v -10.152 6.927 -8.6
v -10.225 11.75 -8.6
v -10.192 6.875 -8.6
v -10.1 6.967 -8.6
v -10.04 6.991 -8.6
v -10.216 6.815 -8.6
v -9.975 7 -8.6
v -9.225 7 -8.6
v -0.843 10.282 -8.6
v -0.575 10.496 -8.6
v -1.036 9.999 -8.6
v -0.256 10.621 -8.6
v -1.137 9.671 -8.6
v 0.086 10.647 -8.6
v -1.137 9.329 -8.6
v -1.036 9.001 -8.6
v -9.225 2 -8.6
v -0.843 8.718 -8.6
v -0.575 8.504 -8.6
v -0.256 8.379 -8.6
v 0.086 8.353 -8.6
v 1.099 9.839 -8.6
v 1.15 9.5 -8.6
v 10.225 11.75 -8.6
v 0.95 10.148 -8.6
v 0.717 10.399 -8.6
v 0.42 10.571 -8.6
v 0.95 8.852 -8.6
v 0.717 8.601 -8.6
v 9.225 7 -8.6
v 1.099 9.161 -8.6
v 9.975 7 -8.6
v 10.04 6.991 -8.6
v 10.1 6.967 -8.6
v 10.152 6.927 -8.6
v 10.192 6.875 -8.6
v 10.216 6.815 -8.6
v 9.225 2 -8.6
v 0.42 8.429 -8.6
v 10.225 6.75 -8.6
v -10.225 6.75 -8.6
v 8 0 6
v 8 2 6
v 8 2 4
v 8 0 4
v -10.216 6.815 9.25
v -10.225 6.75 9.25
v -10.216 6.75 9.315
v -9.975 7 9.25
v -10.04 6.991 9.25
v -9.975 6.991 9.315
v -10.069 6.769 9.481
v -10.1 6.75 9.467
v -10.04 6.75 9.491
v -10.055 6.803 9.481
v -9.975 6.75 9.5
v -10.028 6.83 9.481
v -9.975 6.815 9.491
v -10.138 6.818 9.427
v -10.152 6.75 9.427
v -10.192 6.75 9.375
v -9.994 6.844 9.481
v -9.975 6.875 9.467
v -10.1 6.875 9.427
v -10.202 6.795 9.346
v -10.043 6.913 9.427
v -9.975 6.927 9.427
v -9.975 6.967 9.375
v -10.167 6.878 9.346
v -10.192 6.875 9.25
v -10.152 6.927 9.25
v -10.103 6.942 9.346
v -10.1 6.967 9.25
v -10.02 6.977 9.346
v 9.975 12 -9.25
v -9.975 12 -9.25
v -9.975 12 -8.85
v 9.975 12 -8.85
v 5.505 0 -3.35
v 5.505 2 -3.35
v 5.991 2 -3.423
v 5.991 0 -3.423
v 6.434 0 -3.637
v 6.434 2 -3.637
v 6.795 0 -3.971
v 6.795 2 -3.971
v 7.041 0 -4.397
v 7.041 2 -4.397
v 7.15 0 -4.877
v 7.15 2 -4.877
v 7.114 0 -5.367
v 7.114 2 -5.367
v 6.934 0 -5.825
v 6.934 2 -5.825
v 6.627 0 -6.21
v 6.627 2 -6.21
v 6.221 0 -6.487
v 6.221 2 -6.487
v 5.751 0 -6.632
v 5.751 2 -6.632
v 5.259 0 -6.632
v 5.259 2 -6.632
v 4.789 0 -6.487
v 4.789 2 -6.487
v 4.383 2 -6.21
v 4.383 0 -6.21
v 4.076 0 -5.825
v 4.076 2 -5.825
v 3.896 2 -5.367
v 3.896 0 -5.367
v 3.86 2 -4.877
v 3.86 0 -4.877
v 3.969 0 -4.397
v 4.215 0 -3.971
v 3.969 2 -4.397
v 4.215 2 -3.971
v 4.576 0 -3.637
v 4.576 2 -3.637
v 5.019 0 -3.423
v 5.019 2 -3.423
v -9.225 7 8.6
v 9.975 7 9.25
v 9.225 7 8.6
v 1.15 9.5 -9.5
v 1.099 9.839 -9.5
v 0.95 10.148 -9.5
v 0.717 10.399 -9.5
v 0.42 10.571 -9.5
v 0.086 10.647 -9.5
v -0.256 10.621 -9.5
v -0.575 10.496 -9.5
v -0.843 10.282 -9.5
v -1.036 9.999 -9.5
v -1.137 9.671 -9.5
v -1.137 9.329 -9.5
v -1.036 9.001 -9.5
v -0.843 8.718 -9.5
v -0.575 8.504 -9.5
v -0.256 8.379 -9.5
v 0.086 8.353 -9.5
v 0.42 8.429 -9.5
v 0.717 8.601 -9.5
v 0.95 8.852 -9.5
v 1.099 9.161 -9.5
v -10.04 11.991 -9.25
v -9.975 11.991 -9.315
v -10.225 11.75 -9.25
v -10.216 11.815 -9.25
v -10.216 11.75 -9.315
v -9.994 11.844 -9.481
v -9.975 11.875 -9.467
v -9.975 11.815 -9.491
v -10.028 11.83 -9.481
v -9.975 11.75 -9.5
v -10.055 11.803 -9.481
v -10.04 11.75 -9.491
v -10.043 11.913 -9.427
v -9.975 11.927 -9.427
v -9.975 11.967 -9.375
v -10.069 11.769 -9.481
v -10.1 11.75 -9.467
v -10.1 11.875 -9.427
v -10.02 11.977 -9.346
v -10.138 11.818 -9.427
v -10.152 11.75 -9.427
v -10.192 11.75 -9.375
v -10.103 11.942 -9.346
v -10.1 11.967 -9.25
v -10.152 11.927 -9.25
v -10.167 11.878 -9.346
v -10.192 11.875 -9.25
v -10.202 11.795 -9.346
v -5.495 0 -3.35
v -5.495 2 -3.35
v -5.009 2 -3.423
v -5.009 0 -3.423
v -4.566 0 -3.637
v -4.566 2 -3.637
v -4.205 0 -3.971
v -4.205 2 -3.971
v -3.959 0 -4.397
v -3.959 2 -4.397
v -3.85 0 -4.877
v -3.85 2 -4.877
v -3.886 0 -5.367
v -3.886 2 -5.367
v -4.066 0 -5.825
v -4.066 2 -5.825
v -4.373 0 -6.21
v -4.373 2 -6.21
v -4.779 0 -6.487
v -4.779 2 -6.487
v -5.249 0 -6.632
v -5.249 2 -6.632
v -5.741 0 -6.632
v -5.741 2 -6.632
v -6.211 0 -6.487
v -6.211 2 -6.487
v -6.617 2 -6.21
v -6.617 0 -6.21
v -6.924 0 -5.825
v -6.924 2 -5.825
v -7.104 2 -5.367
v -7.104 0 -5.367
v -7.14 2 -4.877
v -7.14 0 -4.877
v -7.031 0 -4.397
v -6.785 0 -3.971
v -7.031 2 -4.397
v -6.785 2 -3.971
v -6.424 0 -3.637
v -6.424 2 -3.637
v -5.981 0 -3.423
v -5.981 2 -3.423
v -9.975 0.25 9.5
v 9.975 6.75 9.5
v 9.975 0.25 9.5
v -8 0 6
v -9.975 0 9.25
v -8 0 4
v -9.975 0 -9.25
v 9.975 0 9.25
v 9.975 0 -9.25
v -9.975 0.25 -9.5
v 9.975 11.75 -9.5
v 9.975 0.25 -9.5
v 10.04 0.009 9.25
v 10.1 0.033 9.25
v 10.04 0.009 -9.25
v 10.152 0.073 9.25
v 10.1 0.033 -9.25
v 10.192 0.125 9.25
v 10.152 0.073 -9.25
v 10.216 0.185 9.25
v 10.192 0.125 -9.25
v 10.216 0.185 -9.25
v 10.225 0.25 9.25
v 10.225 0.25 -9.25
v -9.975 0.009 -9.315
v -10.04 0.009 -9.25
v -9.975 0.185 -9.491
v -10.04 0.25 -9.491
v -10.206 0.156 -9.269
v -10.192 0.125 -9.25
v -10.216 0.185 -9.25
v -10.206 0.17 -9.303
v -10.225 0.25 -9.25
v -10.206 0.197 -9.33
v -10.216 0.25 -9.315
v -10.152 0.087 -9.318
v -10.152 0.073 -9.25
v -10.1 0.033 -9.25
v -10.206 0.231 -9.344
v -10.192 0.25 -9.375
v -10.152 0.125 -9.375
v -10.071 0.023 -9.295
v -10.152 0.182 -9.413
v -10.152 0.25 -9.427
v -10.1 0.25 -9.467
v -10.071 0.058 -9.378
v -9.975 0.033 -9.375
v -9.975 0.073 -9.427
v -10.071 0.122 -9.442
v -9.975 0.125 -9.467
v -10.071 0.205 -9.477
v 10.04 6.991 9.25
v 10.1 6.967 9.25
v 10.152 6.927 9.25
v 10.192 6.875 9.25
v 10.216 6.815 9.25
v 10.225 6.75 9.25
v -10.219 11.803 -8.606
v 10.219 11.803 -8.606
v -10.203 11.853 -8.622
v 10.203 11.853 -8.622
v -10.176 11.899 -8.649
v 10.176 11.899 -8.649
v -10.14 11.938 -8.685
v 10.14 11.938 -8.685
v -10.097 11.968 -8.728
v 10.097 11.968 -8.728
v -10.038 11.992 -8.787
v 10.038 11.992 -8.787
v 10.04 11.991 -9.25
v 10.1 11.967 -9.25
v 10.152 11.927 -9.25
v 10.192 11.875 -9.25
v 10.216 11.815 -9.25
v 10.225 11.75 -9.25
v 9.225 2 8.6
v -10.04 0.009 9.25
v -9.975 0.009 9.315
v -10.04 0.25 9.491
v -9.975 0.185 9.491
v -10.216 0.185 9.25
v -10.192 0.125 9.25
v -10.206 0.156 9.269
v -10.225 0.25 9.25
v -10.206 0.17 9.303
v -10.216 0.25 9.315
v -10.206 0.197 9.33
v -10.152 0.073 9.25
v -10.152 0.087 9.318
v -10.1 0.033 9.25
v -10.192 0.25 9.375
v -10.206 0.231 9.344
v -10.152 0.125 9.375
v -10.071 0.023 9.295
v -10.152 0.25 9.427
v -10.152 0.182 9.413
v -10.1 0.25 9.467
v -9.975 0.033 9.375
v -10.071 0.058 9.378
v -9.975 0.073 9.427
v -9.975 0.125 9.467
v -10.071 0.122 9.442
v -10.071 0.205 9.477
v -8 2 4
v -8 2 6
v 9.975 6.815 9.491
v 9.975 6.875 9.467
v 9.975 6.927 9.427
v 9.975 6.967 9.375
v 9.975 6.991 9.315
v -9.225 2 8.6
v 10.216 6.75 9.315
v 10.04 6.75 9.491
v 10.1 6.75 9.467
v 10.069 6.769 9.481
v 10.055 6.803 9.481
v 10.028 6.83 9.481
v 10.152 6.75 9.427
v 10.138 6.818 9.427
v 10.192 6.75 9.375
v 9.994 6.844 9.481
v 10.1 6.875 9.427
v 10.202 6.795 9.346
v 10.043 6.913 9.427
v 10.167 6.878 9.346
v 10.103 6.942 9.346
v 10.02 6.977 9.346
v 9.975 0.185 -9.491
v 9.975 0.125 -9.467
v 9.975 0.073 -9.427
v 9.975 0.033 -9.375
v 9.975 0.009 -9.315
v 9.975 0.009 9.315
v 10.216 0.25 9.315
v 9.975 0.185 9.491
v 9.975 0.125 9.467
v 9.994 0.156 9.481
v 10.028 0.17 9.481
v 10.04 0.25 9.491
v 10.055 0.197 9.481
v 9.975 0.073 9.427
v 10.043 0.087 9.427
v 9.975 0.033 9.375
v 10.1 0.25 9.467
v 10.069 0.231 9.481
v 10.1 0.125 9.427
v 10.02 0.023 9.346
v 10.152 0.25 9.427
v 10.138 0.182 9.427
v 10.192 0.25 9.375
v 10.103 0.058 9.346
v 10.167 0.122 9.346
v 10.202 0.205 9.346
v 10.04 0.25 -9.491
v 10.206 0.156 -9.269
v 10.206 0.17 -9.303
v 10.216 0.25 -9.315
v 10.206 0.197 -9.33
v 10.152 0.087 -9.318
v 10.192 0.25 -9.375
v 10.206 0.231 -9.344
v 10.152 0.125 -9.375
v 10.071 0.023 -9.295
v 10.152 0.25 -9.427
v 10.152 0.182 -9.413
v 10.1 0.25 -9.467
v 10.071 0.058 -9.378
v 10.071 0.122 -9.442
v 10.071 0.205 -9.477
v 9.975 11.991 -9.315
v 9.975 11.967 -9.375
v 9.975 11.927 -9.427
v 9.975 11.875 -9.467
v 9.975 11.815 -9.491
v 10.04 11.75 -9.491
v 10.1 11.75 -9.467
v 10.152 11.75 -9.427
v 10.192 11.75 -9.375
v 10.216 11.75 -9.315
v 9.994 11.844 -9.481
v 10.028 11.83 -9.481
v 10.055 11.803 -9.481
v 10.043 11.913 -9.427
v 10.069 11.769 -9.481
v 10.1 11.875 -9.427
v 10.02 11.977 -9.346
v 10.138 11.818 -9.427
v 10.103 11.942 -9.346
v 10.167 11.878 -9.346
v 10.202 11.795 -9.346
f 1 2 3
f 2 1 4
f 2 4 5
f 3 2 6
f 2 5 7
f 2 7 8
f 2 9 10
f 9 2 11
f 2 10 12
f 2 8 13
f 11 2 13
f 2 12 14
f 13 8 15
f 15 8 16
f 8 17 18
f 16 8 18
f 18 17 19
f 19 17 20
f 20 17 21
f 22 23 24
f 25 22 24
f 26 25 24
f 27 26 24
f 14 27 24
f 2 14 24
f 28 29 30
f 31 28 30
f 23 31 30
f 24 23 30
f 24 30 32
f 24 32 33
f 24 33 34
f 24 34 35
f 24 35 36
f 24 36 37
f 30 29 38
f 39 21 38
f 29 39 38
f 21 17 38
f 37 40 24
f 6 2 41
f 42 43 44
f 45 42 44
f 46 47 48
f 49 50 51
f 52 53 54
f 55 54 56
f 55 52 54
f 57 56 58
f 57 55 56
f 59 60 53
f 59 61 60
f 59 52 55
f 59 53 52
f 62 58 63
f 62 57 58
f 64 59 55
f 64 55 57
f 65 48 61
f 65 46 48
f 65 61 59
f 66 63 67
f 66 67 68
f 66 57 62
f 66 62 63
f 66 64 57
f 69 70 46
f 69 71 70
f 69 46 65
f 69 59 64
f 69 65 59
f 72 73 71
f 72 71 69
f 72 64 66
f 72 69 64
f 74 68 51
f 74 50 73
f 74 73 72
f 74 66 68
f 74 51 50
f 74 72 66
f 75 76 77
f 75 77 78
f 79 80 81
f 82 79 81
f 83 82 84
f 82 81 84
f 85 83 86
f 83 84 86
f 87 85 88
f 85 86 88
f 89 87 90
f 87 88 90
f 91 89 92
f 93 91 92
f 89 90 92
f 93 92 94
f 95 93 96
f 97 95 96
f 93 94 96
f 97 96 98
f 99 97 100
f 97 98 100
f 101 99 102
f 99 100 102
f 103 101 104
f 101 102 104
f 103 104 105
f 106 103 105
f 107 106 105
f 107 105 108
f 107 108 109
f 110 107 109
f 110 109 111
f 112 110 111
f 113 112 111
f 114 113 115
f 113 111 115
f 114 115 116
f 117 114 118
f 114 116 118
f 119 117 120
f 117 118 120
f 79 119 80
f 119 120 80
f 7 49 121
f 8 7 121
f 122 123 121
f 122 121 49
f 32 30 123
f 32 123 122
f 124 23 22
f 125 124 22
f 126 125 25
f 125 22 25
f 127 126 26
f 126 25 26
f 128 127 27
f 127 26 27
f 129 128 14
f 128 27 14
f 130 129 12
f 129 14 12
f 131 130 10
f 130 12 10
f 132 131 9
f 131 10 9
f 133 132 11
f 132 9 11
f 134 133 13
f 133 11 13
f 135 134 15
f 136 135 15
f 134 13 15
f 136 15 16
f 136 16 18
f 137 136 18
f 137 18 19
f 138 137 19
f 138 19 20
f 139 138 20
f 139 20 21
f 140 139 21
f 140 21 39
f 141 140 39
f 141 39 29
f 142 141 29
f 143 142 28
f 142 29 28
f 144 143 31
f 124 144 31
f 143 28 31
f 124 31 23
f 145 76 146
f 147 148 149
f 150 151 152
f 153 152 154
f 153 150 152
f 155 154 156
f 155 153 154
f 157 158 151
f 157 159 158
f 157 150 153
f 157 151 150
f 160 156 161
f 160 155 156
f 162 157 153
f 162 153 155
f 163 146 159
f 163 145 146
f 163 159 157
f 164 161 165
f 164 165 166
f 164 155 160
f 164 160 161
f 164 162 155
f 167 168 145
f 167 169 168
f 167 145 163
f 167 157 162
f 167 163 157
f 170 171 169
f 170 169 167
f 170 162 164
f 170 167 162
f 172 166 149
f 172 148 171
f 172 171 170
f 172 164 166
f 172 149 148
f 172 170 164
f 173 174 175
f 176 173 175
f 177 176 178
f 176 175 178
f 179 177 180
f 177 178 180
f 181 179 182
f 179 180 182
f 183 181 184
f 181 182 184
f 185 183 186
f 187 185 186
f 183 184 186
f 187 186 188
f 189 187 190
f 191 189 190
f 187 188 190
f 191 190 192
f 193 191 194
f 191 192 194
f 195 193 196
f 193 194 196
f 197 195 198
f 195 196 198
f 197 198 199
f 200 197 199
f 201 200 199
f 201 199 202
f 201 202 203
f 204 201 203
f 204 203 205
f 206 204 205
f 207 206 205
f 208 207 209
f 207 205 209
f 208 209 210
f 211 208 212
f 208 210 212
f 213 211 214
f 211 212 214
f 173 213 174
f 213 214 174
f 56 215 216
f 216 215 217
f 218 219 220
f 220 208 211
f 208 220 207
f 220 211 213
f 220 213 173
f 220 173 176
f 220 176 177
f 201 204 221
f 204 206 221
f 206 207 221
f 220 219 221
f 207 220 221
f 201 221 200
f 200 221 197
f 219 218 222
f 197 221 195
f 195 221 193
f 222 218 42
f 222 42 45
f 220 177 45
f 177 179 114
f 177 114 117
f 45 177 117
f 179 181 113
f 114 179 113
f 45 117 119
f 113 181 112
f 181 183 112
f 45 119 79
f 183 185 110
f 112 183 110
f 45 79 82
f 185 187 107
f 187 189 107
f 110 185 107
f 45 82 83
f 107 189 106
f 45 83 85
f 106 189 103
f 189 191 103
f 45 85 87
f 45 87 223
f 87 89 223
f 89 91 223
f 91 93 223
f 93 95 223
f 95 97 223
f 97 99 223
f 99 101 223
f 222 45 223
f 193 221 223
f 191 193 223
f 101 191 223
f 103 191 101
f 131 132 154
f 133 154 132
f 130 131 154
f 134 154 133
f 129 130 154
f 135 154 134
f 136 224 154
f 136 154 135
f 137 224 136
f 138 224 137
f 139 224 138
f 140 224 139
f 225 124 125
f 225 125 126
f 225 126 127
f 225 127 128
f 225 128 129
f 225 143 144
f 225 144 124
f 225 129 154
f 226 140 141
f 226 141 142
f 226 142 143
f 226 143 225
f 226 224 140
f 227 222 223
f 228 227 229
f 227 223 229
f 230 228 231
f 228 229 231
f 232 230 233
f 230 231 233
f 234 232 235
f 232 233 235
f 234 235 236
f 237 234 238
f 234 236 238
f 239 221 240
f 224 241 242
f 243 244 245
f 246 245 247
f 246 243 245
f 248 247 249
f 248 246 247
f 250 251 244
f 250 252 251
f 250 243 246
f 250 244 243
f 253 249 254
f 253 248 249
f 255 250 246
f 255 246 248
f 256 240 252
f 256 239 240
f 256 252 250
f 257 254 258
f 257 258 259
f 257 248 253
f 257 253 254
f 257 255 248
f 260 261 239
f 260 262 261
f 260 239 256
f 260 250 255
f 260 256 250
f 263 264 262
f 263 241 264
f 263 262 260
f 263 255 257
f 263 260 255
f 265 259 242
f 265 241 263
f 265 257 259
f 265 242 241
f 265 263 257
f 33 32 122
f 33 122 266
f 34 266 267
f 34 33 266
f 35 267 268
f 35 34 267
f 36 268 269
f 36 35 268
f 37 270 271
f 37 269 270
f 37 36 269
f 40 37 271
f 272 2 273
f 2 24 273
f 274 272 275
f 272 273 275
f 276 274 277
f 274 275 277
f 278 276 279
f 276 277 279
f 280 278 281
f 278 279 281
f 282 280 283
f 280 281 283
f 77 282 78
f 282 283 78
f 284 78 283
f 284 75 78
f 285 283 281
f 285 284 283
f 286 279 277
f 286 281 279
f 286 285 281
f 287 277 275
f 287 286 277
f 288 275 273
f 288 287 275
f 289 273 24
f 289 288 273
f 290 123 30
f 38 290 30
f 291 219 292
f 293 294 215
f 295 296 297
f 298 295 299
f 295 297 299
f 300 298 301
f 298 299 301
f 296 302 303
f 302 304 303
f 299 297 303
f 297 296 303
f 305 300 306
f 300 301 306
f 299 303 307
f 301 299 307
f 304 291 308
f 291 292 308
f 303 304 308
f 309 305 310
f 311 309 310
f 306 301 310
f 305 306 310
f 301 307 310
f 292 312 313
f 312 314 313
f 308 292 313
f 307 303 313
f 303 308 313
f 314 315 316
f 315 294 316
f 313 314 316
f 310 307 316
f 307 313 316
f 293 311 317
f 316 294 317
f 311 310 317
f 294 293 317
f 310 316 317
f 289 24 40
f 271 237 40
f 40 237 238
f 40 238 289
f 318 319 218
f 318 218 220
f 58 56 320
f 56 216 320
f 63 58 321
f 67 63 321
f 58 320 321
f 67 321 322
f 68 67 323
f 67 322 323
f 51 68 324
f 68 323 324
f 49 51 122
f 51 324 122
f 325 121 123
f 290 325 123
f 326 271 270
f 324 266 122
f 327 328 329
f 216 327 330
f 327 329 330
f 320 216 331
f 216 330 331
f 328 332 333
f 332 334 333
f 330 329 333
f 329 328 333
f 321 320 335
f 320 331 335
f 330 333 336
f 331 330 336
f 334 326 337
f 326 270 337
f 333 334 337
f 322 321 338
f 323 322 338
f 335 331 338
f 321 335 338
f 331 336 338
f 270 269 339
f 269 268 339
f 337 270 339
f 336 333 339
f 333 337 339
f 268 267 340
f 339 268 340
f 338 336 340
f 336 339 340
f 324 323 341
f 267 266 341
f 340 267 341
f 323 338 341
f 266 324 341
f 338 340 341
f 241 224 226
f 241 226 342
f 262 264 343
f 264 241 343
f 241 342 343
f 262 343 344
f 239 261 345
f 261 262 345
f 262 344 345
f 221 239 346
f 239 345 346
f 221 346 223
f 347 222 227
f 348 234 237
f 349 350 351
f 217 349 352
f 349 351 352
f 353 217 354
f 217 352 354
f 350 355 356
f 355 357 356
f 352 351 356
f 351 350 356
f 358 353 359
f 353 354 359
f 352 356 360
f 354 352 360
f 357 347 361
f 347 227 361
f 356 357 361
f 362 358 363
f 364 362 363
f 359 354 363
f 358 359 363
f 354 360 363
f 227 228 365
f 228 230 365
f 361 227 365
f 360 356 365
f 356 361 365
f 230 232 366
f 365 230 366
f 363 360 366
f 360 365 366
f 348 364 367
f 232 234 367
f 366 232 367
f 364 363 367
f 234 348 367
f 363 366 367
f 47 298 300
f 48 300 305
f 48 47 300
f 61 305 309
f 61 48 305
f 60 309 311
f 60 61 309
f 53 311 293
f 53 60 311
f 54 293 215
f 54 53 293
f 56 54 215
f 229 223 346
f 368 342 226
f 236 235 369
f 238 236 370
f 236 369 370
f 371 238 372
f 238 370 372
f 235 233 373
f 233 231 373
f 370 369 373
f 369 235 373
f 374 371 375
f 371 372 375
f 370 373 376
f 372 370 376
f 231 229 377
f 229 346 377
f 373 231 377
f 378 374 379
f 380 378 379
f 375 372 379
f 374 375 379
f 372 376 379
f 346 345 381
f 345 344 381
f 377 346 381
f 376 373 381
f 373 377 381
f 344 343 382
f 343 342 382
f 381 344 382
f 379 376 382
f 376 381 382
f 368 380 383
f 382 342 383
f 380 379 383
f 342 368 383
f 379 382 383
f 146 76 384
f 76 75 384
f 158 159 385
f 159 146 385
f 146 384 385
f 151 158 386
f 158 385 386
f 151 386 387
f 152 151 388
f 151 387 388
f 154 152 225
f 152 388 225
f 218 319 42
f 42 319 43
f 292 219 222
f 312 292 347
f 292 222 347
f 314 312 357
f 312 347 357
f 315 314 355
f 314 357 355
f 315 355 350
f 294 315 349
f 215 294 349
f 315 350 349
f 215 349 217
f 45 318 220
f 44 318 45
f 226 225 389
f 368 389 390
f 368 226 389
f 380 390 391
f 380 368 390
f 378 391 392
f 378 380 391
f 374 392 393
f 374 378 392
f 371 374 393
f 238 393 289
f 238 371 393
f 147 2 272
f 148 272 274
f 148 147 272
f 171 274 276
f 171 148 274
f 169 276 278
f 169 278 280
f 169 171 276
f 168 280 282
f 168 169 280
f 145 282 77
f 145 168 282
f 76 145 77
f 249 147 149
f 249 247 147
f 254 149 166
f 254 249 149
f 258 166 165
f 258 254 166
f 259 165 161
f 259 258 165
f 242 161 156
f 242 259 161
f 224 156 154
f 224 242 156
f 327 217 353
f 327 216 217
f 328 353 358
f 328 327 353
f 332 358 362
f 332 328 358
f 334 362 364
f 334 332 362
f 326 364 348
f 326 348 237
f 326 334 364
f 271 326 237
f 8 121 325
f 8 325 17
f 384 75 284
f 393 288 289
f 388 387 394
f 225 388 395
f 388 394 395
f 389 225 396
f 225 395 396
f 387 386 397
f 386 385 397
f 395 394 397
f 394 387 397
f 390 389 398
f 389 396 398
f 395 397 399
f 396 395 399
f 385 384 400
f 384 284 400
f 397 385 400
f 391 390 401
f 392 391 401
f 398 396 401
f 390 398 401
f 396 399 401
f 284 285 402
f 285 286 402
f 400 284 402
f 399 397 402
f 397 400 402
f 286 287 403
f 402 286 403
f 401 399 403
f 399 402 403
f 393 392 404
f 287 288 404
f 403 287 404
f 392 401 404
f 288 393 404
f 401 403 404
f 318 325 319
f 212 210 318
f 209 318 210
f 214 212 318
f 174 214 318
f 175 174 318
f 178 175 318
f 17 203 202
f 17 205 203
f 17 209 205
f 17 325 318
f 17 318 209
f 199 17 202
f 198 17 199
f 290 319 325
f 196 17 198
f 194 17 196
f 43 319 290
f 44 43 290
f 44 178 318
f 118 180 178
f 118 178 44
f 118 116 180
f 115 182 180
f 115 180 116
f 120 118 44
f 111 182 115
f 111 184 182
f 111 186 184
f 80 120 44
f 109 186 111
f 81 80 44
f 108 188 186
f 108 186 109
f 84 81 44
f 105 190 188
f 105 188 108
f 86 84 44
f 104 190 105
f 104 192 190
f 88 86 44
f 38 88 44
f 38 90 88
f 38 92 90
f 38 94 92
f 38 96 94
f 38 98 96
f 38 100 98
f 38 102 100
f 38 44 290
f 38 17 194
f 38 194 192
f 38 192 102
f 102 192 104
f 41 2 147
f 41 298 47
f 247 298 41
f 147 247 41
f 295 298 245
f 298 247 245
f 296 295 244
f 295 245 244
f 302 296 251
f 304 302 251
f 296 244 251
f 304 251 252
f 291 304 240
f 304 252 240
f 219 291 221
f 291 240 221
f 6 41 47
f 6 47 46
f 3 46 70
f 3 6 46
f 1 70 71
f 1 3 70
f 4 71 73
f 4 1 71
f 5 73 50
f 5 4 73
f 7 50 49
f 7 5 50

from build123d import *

# Parameters (mm, degrees)
SKETCH2_W           = 20.45
SKETCH2_H           = 19
BOSS_EXTRUDE1_DEPTH = 7
SKETCH3_W           = 18.45
SKETCH3_H           = 17.2
CUT_EXTRUDE1_DEPTH  = 5
SKETCH7_R           = 1.65
CUT_EXTRUDE2_DEPTH  = 2
SKETCH13_W          = 16
SKETCH13_H          = 2
CUT_EXTRUDE4_DEPTH  = 2
SKETCH15_W          = 20.45
SKETCH15_H          = 0.9
BOSS_EXTRUDE2_DEPTH = 5
SKETCH16_R          = 1.15
CUT_EXTRUDE5_DEPTH  = 0.9
FILLET2_R           = 0.25


with BuildPart() as part:
    # Sketch2 → Boss-Extrude1 (new body)
    with BuildSketch(Plane(origin=(0, 0, 0), x_dir=(1, 0, 0), z_dir=(0, 1, 0))):
        Rectangle(SKETCH2_W, SKETCH2_H)
    extrude(amount=BOSS_EXTRUDE1_DEPTH)

    # Sketch3 → Cut-Extrude1 (cut)
    with BuildSketch(Plane(origin=(0, 7, 0), x_dir=(1, 0, 0), z_dir=(0, 1, 0))):
        Rectangle(SKETCH3_W, SKETCH3_H)
    extrude(amount=-CUT_EXTRUDE1_DEPTH, mode=Mode.SUBTRACT)

    # Sketch7 → Cut-Extrude2 (cut)
    with BuildSketch(Plane(origin=(0, 2, 0), x_dir=(1, 0, 0), z_dir=(0, 1, 0))):
        with Locations(Location((-5.495, 5, 0), (0, 0, 270))):
            Circle(SKETCH7_R)
        with Locations(Location((5.505, 5, 0), (0, 0, 270))):
            Circle(SKETCH7_R)
    extrude(amount=-CUT_EXTRUDE2_DEPTH, mode=Mode.SUBTRACT)

    # Sketch13 → Cut-Extrude4 (cut)
    with BuildSketch(Plane(origin=(0, 2, 0), x_dir=(1, 0, 0), z_dir=(0, 1, 0))):
        with Locations((0, -5)):
            Rectangle(SKETCH13_W, SKETCH13_H)
    extrude(amount=-CUT_EXTRUDE4_DEPTH, mode=Mode.SUBTRACT)

    # Sketch15 → Boss-Extrude2 (add)
    with BuildSketch(Plane(origin=(0, 7, 0), x_dir=(1, 0, 0), z_dir=(0, 1, 0))):
        with Locations((0, 9.05)):
            Rectangle(SKETCH15_W, SKETCH15_H)
    extrude(amount=BOSS_EXTRUDE2_DEPTH)

    # Sketch16 → Cut-Extrude5 (cut)
    with BuildSketch(Plane.XY.offset(-8.6)):
        with Locations((0, 9.5)):
            Circle(SKETCH16_R)
    extrude(amount=-CUT_EXTRUDE5_DEPTH, mode=Mode.SUBTRACT)

    # Fillet2
    fillet2_edges = [part.edges().sort_by_distance(p)[0] for p in [
        (10.225, 7, 0.45),
        (0, 0, -9.5),
        (-10.225, 7, 0.45),
        (10.225, 0, 0),
        (-10.225, 12, -9.05),
        (0, 12, -8.6),
        (10.225, 12, -9.05),
        (0, 0, 9.5),
        (0, 12, -9.5),
        (-10.225, 0, 0),
        (-10.225, 6, -9.5),
        (10.225, 6, -9.5),
        (10.225, 3.5, 9.5),
        (-10.225, 3.5, 9.5),
        (0, 7, 9.5),
    ]]
    fillet(fillet2_edges, radius=FILLET2_R)


solid = part.part
